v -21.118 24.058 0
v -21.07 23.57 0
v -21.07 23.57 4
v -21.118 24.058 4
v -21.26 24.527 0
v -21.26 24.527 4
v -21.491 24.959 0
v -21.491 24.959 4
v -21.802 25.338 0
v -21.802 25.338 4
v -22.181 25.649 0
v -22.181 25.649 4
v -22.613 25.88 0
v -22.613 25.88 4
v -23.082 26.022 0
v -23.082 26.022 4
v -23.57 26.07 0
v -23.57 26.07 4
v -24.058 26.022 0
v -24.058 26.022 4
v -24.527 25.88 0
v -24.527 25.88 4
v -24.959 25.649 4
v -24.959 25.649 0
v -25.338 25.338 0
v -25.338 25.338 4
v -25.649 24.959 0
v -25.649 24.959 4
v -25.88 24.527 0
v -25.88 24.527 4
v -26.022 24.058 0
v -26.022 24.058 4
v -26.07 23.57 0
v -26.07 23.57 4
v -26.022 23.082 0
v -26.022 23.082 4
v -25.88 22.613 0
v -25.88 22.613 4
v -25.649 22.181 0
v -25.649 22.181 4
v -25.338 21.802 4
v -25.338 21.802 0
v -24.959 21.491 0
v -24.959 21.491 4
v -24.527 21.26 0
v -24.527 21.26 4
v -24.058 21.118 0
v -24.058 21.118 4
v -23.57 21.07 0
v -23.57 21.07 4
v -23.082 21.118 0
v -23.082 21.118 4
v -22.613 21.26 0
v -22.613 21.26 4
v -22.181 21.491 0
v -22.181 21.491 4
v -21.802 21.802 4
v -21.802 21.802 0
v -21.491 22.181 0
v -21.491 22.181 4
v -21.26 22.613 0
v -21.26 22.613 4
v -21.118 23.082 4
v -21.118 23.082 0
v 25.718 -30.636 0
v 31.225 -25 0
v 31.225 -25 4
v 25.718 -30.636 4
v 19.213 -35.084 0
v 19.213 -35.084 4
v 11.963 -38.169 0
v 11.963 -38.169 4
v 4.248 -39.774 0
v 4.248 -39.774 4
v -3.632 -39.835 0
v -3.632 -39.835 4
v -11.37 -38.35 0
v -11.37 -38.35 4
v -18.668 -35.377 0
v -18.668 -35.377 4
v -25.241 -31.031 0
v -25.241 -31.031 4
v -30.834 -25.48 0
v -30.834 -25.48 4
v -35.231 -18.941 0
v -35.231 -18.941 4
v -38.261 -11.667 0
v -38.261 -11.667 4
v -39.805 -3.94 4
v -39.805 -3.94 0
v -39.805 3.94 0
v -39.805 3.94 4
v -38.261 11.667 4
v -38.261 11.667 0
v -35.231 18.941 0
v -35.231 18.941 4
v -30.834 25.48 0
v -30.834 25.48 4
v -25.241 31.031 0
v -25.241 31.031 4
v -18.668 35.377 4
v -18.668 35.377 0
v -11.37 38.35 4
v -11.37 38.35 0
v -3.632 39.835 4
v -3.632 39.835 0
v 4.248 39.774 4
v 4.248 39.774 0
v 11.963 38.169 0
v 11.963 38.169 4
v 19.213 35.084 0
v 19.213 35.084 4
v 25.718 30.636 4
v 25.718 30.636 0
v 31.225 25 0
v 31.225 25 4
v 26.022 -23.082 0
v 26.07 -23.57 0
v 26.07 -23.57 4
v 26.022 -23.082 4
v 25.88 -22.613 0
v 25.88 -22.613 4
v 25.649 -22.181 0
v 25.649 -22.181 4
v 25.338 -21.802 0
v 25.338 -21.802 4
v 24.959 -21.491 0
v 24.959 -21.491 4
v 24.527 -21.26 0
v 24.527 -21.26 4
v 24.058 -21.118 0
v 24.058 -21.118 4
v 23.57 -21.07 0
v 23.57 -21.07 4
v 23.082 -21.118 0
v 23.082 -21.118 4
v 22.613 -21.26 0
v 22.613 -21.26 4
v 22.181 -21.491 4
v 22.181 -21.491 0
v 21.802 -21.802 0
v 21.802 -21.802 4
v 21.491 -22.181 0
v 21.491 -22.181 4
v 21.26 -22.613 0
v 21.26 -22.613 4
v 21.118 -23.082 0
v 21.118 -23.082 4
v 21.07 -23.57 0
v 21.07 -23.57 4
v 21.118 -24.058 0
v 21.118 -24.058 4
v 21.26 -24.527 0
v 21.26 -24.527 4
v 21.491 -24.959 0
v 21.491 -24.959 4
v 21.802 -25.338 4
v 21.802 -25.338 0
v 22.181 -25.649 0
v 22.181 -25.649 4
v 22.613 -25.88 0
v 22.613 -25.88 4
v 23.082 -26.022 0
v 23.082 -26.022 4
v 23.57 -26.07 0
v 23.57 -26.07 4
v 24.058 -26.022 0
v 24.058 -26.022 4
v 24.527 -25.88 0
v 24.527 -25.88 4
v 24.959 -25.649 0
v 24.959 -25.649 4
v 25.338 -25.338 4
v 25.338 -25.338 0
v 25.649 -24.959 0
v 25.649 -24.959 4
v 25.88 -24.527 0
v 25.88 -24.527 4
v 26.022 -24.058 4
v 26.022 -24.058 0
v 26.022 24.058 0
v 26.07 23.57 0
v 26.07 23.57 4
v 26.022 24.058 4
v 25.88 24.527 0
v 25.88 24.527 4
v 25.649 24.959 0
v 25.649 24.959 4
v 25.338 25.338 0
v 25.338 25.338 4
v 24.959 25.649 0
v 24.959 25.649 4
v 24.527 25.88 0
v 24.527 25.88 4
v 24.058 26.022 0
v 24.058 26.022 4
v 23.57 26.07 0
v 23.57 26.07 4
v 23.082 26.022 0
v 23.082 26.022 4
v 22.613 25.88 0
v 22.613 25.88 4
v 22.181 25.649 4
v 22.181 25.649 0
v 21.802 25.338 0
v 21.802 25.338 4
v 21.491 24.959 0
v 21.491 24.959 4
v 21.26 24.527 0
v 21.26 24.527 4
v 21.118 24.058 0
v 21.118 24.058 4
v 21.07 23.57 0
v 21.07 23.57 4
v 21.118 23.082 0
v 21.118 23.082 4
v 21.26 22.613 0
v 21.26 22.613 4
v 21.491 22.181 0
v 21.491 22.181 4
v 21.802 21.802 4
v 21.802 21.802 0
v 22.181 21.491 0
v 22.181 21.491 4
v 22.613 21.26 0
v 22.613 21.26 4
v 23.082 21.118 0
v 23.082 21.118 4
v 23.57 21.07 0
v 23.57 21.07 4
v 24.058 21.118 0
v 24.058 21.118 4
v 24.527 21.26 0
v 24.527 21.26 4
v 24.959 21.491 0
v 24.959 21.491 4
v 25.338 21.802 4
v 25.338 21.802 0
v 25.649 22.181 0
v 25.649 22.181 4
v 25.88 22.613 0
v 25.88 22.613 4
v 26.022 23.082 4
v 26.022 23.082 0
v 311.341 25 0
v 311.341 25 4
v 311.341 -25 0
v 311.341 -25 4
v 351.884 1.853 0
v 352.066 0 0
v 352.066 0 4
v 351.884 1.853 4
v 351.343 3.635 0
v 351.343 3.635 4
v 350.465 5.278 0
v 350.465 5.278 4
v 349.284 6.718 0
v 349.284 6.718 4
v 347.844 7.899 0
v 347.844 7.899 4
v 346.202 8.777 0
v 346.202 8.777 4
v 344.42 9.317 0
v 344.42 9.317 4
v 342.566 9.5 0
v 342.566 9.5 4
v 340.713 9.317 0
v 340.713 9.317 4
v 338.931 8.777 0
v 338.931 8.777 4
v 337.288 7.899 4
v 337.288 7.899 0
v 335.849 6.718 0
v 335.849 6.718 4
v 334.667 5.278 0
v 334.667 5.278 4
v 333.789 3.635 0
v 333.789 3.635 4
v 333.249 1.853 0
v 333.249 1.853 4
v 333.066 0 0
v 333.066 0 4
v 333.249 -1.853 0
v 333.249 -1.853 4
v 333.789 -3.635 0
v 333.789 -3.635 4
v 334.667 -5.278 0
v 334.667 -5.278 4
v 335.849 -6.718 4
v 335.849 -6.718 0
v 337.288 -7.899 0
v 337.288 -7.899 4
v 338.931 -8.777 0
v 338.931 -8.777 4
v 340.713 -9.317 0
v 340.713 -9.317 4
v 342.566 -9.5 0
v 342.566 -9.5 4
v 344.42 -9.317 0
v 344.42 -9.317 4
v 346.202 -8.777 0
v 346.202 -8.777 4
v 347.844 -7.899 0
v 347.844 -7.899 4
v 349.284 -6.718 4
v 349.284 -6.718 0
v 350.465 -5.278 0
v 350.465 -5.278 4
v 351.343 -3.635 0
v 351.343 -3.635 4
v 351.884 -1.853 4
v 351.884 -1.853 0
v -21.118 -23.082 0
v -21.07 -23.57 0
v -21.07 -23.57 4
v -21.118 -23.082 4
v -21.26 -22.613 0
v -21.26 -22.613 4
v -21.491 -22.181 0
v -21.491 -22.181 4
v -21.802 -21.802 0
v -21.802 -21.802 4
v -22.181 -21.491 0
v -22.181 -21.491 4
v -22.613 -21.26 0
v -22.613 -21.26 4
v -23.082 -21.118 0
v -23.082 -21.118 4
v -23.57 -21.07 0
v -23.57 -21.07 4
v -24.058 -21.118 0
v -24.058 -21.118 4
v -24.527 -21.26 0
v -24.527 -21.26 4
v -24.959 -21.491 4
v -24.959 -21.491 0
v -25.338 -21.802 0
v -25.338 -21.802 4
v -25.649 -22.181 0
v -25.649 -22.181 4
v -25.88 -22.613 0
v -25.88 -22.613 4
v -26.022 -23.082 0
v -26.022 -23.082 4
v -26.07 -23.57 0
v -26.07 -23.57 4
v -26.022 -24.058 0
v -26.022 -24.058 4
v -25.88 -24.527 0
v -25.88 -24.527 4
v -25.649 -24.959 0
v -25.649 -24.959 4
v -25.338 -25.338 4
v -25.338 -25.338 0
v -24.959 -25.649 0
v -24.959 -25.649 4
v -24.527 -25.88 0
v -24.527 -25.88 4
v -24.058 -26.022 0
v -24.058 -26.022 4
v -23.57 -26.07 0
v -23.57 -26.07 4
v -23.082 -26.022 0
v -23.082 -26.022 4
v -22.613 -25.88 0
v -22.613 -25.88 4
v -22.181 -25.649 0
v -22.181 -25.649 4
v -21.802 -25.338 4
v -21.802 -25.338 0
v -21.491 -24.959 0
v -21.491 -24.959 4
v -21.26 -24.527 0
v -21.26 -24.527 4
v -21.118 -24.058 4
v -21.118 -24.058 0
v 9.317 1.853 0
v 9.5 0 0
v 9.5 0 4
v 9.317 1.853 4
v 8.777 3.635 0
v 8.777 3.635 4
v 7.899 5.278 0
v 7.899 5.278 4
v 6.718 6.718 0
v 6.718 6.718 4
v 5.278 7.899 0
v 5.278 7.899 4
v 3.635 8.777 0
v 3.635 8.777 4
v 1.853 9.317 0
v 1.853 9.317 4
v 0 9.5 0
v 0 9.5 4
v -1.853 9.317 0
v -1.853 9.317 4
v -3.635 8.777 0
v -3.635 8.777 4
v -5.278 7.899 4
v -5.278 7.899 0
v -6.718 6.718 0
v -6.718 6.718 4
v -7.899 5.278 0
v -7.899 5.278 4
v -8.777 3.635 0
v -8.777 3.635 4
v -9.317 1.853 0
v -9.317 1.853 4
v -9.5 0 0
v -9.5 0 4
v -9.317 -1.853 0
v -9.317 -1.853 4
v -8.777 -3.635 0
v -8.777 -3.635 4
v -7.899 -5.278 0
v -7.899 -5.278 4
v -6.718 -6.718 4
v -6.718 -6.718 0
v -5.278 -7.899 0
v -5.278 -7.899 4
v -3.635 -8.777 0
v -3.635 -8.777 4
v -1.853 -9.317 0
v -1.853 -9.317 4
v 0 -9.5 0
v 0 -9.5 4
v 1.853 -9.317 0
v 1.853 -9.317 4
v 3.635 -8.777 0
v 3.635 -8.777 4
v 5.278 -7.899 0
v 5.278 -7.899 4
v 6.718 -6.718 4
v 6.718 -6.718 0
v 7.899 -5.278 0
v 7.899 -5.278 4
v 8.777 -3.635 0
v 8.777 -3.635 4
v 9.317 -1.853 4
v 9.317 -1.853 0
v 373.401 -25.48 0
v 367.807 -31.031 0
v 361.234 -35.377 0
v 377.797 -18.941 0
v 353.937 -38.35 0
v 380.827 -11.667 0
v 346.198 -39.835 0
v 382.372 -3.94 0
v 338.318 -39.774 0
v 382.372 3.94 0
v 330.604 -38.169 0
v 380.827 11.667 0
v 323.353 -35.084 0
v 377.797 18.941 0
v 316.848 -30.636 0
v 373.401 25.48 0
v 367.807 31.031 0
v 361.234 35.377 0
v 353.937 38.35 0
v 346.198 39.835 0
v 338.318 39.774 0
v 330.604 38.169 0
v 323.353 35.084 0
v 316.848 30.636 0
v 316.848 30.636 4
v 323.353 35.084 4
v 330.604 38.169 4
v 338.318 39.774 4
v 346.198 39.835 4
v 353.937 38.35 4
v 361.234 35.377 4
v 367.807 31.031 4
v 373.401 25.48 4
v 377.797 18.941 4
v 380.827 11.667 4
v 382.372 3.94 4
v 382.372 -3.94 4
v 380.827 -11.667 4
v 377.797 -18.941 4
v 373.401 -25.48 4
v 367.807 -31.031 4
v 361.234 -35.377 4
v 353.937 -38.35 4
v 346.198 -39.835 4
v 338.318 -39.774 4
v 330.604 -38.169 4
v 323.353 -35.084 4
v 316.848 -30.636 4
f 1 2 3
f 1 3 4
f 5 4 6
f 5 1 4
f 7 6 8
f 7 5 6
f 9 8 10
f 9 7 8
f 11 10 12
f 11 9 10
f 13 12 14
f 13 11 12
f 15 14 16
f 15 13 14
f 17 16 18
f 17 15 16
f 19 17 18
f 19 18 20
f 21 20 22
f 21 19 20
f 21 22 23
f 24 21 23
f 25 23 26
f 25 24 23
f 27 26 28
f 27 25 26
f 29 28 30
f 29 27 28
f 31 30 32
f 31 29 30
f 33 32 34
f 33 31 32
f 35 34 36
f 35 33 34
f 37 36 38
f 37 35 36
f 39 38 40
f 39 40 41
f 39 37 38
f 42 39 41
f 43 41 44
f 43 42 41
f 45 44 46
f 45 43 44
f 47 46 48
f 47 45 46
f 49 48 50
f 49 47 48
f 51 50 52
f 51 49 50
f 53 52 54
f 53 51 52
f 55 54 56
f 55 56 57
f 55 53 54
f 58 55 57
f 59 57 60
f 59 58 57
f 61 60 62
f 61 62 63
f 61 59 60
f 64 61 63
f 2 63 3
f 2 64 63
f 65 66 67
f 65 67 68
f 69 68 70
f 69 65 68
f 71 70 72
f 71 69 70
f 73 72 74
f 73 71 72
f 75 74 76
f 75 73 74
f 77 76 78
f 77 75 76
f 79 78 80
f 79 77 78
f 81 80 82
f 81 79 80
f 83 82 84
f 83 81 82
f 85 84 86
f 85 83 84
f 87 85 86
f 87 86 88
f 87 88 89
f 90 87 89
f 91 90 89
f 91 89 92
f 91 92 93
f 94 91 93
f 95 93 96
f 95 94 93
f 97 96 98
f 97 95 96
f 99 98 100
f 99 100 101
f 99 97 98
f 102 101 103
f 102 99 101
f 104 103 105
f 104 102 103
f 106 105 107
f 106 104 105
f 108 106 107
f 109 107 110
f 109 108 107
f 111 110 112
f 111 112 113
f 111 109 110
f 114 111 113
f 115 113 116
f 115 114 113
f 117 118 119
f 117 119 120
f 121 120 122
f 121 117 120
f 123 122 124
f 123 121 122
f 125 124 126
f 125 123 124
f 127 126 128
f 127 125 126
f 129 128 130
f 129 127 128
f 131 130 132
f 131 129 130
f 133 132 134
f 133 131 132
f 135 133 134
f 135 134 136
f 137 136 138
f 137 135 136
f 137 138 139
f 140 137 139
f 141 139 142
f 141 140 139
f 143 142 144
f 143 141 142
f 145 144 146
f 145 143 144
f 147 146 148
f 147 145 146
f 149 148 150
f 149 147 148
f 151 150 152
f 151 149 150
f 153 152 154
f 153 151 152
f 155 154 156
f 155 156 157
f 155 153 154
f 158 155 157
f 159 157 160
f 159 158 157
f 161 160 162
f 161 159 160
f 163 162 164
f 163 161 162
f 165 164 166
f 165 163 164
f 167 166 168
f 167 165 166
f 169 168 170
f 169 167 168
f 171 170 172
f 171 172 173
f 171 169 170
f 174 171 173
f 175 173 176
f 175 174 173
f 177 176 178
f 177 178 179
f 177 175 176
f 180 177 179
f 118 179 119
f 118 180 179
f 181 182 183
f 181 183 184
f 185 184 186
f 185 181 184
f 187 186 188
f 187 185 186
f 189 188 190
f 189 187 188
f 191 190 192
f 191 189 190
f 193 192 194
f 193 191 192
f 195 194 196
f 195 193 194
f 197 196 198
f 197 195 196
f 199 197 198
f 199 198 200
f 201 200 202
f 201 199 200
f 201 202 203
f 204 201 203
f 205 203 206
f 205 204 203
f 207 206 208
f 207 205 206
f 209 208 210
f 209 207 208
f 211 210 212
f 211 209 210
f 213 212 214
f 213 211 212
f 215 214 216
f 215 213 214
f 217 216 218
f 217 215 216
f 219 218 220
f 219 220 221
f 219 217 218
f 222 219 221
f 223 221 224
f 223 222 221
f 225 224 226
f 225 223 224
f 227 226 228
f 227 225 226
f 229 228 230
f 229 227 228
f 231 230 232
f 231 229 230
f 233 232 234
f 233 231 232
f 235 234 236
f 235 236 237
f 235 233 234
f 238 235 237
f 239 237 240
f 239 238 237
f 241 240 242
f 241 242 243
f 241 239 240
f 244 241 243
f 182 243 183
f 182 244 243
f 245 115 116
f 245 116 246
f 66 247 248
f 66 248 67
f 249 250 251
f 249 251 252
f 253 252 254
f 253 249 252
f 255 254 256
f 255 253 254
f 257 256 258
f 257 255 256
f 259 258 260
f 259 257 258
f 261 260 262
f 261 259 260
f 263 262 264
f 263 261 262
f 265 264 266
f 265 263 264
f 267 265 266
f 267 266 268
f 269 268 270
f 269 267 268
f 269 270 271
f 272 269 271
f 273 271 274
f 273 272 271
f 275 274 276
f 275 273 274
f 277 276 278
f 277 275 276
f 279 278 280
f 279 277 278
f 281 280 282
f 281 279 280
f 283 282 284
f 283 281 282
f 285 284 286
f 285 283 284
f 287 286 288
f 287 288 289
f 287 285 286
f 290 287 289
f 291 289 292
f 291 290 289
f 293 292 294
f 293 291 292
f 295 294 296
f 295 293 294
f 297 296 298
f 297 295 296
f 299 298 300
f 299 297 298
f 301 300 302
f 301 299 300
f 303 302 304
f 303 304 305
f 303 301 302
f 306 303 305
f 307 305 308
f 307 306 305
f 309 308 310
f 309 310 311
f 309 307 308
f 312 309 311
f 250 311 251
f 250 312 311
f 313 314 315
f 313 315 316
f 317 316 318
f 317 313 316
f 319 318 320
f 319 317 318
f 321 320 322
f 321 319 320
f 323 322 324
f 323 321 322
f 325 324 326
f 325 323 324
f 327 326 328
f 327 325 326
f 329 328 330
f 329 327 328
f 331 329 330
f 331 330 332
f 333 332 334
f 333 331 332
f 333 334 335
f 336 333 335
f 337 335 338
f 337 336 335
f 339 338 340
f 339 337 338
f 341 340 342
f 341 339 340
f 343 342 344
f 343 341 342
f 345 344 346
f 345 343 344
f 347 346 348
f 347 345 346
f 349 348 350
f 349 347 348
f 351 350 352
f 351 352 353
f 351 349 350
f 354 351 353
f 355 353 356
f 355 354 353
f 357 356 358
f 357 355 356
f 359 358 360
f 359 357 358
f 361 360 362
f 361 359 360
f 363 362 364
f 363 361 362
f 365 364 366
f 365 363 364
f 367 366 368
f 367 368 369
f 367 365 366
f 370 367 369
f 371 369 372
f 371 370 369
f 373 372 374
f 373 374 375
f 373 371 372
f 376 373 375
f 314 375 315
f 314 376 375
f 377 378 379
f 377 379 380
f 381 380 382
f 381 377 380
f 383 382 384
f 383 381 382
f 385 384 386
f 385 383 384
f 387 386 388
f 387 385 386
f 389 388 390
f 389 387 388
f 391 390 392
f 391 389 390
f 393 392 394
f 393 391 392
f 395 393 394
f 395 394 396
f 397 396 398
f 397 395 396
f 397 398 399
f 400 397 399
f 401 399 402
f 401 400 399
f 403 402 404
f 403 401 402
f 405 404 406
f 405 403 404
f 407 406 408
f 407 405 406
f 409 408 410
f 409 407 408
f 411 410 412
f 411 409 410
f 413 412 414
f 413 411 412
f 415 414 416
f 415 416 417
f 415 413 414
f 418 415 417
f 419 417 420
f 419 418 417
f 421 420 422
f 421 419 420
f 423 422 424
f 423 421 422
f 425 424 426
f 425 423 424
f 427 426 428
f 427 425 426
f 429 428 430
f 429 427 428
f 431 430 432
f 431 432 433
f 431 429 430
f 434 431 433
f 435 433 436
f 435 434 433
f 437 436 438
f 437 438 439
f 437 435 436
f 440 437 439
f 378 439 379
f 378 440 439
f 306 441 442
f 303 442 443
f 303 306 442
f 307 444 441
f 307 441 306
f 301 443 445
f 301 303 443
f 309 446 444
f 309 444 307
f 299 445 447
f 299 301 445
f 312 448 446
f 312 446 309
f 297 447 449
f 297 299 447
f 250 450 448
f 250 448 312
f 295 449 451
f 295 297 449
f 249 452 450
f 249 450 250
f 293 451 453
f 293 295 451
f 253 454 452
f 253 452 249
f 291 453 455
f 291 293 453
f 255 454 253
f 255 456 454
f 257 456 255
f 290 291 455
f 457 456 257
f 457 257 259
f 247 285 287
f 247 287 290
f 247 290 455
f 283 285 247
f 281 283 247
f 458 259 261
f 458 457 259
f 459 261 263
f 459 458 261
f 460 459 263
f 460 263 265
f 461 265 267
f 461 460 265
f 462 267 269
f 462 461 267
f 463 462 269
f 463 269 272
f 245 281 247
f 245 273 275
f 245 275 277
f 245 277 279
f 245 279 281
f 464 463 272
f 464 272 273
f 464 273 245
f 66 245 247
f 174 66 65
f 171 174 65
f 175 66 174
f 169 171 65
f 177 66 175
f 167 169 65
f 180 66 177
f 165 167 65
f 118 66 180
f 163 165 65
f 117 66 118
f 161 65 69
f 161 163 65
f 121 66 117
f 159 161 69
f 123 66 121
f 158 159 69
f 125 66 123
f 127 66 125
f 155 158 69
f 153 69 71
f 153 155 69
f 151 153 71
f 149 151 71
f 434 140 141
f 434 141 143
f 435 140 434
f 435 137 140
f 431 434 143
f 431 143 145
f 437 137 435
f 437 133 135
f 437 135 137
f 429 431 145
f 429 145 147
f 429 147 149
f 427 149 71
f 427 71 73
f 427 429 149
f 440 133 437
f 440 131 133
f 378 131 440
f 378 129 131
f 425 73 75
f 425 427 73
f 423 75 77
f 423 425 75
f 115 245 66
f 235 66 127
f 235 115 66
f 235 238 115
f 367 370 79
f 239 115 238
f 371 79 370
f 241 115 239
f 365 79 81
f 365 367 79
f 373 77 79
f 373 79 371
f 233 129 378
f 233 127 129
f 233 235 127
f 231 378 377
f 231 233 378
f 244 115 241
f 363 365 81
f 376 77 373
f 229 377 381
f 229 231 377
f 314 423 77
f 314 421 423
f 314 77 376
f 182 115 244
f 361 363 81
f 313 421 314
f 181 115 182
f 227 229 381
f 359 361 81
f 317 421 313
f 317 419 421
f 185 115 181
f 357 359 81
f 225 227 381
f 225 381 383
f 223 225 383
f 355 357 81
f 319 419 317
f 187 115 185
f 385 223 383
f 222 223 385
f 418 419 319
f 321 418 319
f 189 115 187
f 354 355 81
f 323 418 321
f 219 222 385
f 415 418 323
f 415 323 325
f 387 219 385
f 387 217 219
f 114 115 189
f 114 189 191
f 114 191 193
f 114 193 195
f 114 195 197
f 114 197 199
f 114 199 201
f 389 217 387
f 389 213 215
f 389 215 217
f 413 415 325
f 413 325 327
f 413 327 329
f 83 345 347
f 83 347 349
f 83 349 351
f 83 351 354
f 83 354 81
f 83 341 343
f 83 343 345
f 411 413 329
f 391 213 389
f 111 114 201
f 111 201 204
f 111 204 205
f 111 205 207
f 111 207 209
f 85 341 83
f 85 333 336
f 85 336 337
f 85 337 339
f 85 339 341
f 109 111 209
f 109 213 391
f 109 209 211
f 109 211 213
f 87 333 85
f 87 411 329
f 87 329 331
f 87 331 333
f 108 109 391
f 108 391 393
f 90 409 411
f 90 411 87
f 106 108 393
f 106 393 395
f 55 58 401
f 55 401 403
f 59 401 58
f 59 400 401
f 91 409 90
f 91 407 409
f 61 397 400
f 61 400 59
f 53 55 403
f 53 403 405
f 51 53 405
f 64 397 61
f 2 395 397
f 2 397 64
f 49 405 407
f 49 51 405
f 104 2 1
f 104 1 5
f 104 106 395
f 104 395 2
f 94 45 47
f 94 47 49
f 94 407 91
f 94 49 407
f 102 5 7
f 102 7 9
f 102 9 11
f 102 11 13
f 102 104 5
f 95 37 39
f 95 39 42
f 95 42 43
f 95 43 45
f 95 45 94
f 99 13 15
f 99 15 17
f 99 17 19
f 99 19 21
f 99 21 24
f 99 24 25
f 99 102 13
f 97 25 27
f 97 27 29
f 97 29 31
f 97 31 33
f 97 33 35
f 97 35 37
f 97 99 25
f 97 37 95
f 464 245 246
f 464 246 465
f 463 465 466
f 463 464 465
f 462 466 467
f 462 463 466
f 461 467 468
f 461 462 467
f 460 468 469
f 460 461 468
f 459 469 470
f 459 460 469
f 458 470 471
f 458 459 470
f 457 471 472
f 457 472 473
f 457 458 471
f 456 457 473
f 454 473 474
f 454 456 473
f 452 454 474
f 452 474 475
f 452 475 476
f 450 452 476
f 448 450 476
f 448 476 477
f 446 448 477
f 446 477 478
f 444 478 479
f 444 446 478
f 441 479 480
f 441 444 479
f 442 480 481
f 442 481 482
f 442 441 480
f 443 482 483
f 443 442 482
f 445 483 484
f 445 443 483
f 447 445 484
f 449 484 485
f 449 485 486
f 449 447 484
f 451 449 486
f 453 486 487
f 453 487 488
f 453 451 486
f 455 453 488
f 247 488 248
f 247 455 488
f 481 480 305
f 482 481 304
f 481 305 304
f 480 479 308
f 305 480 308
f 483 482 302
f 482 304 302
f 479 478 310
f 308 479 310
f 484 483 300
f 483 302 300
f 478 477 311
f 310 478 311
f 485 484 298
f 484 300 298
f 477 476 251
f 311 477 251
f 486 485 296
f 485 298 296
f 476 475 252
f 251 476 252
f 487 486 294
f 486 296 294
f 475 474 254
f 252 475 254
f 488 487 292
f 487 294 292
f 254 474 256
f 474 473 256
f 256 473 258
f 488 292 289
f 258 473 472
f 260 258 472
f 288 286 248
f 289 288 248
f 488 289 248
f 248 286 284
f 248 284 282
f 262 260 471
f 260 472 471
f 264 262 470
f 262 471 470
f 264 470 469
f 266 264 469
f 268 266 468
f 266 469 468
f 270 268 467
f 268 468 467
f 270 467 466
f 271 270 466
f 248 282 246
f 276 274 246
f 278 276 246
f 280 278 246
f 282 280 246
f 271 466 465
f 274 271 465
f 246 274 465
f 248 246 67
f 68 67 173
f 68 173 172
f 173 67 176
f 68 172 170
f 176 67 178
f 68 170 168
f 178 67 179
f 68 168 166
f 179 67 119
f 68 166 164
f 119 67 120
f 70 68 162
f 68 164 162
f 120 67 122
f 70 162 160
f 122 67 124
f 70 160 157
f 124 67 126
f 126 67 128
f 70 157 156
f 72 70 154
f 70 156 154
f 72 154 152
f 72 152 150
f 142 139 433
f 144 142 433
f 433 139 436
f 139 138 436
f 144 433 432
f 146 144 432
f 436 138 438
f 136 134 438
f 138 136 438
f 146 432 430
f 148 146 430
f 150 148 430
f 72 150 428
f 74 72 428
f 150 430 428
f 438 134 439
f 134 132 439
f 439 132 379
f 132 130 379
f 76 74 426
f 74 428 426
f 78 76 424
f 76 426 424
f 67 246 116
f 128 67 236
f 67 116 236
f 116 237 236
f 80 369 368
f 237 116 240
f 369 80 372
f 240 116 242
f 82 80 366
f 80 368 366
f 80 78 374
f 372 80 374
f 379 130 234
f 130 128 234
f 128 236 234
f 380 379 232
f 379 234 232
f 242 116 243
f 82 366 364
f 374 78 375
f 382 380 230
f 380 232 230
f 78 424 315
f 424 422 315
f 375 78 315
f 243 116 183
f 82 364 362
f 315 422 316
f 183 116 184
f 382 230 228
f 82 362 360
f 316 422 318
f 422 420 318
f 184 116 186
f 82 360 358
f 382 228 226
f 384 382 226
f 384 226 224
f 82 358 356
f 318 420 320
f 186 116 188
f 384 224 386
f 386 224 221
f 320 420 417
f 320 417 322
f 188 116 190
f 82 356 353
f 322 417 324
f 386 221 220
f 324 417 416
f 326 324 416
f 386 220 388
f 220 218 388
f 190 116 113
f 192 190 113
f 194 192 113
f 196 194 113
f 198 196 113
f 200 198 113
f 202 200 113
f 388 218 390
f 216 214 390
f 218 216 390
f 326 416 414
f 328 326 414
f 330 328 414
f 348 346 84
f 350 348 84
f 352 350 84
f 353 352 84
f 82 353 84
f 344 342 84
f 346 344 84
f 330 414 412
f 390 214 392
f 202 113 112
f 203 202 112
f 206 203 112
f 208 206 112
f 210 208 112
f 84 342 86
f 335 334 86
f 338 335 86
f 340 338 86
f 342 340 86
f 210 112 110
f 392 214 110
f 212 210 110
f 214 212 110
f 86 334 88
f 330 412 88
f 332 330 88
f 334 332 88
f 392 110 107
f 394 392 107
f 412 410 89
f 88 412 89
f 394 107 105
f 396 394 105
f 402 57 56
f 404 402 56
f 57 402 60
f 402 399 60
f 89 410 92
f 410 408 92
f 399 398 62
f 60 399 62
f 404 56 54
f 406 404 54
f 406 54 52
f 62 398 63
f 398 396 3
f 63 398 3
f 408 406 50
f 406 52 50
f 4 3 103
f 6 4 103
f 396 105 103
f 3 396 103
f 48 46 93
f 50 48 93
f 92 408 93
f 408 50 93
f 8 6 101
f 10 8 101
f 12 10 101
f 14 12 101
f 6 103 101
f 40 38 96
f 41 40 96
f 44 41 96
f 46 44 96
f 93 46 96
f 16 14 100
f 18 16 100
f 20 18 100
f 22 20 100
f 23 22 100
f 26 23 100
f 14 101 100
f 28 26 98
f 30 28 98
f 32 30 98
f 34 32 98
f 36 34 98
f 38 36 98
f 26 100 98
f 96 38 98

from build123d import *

# Parameters (mm, degrees)
SKETCH_1_R      = 2.5
SKETCH_1_R_2    = 9.5
EXTRUDE_1_DEPTH = 4


with BuildPart() as part:
    # 草图1 → 凸台-拉伸1 (new body)
    with BuildSketch(Plane.XY):
        with BuildLine():
            Line((31.224989992, 25), (311.341198994, 25))
            ThreePointArc((311.341198994, 25), (382.566188986, 0), (311.341198994, -25))
            Line((311.341198994, -25), (31.224989992, -25))
            ThreePointArc((31.224989992, -25), (-40, 0), (31.224989992, 25))
        make_face()
        with Locations((-23.57, 23.57)):
            Circle(SKETCH_1_R, mode=Mode.SUBTRACT)
        with Locations((23.57, 23.57)):
            Circle(SKETCH_1_R, mode=Mode.SUBTRACT)
        with Locations((23.57, -23.57)):
            Circle(SKETCH_1_R, mode=Mode.SUBTRACT)
        with Locations((-23.57, -23.57)):
            Circle(SKETCH_1_R, mode=Mode.SUBTRACT)
        with Locations((342.566188986, 0)):
            Circle(SKETCH_1_R_2, mode=Mode.SUBTRACT)
        Circle(SKETCH_1_R_2, mode=Mode.SUBTRACT)
    extrude(amount=EXTRUDE_1_DEPTH)


solid = part.part
